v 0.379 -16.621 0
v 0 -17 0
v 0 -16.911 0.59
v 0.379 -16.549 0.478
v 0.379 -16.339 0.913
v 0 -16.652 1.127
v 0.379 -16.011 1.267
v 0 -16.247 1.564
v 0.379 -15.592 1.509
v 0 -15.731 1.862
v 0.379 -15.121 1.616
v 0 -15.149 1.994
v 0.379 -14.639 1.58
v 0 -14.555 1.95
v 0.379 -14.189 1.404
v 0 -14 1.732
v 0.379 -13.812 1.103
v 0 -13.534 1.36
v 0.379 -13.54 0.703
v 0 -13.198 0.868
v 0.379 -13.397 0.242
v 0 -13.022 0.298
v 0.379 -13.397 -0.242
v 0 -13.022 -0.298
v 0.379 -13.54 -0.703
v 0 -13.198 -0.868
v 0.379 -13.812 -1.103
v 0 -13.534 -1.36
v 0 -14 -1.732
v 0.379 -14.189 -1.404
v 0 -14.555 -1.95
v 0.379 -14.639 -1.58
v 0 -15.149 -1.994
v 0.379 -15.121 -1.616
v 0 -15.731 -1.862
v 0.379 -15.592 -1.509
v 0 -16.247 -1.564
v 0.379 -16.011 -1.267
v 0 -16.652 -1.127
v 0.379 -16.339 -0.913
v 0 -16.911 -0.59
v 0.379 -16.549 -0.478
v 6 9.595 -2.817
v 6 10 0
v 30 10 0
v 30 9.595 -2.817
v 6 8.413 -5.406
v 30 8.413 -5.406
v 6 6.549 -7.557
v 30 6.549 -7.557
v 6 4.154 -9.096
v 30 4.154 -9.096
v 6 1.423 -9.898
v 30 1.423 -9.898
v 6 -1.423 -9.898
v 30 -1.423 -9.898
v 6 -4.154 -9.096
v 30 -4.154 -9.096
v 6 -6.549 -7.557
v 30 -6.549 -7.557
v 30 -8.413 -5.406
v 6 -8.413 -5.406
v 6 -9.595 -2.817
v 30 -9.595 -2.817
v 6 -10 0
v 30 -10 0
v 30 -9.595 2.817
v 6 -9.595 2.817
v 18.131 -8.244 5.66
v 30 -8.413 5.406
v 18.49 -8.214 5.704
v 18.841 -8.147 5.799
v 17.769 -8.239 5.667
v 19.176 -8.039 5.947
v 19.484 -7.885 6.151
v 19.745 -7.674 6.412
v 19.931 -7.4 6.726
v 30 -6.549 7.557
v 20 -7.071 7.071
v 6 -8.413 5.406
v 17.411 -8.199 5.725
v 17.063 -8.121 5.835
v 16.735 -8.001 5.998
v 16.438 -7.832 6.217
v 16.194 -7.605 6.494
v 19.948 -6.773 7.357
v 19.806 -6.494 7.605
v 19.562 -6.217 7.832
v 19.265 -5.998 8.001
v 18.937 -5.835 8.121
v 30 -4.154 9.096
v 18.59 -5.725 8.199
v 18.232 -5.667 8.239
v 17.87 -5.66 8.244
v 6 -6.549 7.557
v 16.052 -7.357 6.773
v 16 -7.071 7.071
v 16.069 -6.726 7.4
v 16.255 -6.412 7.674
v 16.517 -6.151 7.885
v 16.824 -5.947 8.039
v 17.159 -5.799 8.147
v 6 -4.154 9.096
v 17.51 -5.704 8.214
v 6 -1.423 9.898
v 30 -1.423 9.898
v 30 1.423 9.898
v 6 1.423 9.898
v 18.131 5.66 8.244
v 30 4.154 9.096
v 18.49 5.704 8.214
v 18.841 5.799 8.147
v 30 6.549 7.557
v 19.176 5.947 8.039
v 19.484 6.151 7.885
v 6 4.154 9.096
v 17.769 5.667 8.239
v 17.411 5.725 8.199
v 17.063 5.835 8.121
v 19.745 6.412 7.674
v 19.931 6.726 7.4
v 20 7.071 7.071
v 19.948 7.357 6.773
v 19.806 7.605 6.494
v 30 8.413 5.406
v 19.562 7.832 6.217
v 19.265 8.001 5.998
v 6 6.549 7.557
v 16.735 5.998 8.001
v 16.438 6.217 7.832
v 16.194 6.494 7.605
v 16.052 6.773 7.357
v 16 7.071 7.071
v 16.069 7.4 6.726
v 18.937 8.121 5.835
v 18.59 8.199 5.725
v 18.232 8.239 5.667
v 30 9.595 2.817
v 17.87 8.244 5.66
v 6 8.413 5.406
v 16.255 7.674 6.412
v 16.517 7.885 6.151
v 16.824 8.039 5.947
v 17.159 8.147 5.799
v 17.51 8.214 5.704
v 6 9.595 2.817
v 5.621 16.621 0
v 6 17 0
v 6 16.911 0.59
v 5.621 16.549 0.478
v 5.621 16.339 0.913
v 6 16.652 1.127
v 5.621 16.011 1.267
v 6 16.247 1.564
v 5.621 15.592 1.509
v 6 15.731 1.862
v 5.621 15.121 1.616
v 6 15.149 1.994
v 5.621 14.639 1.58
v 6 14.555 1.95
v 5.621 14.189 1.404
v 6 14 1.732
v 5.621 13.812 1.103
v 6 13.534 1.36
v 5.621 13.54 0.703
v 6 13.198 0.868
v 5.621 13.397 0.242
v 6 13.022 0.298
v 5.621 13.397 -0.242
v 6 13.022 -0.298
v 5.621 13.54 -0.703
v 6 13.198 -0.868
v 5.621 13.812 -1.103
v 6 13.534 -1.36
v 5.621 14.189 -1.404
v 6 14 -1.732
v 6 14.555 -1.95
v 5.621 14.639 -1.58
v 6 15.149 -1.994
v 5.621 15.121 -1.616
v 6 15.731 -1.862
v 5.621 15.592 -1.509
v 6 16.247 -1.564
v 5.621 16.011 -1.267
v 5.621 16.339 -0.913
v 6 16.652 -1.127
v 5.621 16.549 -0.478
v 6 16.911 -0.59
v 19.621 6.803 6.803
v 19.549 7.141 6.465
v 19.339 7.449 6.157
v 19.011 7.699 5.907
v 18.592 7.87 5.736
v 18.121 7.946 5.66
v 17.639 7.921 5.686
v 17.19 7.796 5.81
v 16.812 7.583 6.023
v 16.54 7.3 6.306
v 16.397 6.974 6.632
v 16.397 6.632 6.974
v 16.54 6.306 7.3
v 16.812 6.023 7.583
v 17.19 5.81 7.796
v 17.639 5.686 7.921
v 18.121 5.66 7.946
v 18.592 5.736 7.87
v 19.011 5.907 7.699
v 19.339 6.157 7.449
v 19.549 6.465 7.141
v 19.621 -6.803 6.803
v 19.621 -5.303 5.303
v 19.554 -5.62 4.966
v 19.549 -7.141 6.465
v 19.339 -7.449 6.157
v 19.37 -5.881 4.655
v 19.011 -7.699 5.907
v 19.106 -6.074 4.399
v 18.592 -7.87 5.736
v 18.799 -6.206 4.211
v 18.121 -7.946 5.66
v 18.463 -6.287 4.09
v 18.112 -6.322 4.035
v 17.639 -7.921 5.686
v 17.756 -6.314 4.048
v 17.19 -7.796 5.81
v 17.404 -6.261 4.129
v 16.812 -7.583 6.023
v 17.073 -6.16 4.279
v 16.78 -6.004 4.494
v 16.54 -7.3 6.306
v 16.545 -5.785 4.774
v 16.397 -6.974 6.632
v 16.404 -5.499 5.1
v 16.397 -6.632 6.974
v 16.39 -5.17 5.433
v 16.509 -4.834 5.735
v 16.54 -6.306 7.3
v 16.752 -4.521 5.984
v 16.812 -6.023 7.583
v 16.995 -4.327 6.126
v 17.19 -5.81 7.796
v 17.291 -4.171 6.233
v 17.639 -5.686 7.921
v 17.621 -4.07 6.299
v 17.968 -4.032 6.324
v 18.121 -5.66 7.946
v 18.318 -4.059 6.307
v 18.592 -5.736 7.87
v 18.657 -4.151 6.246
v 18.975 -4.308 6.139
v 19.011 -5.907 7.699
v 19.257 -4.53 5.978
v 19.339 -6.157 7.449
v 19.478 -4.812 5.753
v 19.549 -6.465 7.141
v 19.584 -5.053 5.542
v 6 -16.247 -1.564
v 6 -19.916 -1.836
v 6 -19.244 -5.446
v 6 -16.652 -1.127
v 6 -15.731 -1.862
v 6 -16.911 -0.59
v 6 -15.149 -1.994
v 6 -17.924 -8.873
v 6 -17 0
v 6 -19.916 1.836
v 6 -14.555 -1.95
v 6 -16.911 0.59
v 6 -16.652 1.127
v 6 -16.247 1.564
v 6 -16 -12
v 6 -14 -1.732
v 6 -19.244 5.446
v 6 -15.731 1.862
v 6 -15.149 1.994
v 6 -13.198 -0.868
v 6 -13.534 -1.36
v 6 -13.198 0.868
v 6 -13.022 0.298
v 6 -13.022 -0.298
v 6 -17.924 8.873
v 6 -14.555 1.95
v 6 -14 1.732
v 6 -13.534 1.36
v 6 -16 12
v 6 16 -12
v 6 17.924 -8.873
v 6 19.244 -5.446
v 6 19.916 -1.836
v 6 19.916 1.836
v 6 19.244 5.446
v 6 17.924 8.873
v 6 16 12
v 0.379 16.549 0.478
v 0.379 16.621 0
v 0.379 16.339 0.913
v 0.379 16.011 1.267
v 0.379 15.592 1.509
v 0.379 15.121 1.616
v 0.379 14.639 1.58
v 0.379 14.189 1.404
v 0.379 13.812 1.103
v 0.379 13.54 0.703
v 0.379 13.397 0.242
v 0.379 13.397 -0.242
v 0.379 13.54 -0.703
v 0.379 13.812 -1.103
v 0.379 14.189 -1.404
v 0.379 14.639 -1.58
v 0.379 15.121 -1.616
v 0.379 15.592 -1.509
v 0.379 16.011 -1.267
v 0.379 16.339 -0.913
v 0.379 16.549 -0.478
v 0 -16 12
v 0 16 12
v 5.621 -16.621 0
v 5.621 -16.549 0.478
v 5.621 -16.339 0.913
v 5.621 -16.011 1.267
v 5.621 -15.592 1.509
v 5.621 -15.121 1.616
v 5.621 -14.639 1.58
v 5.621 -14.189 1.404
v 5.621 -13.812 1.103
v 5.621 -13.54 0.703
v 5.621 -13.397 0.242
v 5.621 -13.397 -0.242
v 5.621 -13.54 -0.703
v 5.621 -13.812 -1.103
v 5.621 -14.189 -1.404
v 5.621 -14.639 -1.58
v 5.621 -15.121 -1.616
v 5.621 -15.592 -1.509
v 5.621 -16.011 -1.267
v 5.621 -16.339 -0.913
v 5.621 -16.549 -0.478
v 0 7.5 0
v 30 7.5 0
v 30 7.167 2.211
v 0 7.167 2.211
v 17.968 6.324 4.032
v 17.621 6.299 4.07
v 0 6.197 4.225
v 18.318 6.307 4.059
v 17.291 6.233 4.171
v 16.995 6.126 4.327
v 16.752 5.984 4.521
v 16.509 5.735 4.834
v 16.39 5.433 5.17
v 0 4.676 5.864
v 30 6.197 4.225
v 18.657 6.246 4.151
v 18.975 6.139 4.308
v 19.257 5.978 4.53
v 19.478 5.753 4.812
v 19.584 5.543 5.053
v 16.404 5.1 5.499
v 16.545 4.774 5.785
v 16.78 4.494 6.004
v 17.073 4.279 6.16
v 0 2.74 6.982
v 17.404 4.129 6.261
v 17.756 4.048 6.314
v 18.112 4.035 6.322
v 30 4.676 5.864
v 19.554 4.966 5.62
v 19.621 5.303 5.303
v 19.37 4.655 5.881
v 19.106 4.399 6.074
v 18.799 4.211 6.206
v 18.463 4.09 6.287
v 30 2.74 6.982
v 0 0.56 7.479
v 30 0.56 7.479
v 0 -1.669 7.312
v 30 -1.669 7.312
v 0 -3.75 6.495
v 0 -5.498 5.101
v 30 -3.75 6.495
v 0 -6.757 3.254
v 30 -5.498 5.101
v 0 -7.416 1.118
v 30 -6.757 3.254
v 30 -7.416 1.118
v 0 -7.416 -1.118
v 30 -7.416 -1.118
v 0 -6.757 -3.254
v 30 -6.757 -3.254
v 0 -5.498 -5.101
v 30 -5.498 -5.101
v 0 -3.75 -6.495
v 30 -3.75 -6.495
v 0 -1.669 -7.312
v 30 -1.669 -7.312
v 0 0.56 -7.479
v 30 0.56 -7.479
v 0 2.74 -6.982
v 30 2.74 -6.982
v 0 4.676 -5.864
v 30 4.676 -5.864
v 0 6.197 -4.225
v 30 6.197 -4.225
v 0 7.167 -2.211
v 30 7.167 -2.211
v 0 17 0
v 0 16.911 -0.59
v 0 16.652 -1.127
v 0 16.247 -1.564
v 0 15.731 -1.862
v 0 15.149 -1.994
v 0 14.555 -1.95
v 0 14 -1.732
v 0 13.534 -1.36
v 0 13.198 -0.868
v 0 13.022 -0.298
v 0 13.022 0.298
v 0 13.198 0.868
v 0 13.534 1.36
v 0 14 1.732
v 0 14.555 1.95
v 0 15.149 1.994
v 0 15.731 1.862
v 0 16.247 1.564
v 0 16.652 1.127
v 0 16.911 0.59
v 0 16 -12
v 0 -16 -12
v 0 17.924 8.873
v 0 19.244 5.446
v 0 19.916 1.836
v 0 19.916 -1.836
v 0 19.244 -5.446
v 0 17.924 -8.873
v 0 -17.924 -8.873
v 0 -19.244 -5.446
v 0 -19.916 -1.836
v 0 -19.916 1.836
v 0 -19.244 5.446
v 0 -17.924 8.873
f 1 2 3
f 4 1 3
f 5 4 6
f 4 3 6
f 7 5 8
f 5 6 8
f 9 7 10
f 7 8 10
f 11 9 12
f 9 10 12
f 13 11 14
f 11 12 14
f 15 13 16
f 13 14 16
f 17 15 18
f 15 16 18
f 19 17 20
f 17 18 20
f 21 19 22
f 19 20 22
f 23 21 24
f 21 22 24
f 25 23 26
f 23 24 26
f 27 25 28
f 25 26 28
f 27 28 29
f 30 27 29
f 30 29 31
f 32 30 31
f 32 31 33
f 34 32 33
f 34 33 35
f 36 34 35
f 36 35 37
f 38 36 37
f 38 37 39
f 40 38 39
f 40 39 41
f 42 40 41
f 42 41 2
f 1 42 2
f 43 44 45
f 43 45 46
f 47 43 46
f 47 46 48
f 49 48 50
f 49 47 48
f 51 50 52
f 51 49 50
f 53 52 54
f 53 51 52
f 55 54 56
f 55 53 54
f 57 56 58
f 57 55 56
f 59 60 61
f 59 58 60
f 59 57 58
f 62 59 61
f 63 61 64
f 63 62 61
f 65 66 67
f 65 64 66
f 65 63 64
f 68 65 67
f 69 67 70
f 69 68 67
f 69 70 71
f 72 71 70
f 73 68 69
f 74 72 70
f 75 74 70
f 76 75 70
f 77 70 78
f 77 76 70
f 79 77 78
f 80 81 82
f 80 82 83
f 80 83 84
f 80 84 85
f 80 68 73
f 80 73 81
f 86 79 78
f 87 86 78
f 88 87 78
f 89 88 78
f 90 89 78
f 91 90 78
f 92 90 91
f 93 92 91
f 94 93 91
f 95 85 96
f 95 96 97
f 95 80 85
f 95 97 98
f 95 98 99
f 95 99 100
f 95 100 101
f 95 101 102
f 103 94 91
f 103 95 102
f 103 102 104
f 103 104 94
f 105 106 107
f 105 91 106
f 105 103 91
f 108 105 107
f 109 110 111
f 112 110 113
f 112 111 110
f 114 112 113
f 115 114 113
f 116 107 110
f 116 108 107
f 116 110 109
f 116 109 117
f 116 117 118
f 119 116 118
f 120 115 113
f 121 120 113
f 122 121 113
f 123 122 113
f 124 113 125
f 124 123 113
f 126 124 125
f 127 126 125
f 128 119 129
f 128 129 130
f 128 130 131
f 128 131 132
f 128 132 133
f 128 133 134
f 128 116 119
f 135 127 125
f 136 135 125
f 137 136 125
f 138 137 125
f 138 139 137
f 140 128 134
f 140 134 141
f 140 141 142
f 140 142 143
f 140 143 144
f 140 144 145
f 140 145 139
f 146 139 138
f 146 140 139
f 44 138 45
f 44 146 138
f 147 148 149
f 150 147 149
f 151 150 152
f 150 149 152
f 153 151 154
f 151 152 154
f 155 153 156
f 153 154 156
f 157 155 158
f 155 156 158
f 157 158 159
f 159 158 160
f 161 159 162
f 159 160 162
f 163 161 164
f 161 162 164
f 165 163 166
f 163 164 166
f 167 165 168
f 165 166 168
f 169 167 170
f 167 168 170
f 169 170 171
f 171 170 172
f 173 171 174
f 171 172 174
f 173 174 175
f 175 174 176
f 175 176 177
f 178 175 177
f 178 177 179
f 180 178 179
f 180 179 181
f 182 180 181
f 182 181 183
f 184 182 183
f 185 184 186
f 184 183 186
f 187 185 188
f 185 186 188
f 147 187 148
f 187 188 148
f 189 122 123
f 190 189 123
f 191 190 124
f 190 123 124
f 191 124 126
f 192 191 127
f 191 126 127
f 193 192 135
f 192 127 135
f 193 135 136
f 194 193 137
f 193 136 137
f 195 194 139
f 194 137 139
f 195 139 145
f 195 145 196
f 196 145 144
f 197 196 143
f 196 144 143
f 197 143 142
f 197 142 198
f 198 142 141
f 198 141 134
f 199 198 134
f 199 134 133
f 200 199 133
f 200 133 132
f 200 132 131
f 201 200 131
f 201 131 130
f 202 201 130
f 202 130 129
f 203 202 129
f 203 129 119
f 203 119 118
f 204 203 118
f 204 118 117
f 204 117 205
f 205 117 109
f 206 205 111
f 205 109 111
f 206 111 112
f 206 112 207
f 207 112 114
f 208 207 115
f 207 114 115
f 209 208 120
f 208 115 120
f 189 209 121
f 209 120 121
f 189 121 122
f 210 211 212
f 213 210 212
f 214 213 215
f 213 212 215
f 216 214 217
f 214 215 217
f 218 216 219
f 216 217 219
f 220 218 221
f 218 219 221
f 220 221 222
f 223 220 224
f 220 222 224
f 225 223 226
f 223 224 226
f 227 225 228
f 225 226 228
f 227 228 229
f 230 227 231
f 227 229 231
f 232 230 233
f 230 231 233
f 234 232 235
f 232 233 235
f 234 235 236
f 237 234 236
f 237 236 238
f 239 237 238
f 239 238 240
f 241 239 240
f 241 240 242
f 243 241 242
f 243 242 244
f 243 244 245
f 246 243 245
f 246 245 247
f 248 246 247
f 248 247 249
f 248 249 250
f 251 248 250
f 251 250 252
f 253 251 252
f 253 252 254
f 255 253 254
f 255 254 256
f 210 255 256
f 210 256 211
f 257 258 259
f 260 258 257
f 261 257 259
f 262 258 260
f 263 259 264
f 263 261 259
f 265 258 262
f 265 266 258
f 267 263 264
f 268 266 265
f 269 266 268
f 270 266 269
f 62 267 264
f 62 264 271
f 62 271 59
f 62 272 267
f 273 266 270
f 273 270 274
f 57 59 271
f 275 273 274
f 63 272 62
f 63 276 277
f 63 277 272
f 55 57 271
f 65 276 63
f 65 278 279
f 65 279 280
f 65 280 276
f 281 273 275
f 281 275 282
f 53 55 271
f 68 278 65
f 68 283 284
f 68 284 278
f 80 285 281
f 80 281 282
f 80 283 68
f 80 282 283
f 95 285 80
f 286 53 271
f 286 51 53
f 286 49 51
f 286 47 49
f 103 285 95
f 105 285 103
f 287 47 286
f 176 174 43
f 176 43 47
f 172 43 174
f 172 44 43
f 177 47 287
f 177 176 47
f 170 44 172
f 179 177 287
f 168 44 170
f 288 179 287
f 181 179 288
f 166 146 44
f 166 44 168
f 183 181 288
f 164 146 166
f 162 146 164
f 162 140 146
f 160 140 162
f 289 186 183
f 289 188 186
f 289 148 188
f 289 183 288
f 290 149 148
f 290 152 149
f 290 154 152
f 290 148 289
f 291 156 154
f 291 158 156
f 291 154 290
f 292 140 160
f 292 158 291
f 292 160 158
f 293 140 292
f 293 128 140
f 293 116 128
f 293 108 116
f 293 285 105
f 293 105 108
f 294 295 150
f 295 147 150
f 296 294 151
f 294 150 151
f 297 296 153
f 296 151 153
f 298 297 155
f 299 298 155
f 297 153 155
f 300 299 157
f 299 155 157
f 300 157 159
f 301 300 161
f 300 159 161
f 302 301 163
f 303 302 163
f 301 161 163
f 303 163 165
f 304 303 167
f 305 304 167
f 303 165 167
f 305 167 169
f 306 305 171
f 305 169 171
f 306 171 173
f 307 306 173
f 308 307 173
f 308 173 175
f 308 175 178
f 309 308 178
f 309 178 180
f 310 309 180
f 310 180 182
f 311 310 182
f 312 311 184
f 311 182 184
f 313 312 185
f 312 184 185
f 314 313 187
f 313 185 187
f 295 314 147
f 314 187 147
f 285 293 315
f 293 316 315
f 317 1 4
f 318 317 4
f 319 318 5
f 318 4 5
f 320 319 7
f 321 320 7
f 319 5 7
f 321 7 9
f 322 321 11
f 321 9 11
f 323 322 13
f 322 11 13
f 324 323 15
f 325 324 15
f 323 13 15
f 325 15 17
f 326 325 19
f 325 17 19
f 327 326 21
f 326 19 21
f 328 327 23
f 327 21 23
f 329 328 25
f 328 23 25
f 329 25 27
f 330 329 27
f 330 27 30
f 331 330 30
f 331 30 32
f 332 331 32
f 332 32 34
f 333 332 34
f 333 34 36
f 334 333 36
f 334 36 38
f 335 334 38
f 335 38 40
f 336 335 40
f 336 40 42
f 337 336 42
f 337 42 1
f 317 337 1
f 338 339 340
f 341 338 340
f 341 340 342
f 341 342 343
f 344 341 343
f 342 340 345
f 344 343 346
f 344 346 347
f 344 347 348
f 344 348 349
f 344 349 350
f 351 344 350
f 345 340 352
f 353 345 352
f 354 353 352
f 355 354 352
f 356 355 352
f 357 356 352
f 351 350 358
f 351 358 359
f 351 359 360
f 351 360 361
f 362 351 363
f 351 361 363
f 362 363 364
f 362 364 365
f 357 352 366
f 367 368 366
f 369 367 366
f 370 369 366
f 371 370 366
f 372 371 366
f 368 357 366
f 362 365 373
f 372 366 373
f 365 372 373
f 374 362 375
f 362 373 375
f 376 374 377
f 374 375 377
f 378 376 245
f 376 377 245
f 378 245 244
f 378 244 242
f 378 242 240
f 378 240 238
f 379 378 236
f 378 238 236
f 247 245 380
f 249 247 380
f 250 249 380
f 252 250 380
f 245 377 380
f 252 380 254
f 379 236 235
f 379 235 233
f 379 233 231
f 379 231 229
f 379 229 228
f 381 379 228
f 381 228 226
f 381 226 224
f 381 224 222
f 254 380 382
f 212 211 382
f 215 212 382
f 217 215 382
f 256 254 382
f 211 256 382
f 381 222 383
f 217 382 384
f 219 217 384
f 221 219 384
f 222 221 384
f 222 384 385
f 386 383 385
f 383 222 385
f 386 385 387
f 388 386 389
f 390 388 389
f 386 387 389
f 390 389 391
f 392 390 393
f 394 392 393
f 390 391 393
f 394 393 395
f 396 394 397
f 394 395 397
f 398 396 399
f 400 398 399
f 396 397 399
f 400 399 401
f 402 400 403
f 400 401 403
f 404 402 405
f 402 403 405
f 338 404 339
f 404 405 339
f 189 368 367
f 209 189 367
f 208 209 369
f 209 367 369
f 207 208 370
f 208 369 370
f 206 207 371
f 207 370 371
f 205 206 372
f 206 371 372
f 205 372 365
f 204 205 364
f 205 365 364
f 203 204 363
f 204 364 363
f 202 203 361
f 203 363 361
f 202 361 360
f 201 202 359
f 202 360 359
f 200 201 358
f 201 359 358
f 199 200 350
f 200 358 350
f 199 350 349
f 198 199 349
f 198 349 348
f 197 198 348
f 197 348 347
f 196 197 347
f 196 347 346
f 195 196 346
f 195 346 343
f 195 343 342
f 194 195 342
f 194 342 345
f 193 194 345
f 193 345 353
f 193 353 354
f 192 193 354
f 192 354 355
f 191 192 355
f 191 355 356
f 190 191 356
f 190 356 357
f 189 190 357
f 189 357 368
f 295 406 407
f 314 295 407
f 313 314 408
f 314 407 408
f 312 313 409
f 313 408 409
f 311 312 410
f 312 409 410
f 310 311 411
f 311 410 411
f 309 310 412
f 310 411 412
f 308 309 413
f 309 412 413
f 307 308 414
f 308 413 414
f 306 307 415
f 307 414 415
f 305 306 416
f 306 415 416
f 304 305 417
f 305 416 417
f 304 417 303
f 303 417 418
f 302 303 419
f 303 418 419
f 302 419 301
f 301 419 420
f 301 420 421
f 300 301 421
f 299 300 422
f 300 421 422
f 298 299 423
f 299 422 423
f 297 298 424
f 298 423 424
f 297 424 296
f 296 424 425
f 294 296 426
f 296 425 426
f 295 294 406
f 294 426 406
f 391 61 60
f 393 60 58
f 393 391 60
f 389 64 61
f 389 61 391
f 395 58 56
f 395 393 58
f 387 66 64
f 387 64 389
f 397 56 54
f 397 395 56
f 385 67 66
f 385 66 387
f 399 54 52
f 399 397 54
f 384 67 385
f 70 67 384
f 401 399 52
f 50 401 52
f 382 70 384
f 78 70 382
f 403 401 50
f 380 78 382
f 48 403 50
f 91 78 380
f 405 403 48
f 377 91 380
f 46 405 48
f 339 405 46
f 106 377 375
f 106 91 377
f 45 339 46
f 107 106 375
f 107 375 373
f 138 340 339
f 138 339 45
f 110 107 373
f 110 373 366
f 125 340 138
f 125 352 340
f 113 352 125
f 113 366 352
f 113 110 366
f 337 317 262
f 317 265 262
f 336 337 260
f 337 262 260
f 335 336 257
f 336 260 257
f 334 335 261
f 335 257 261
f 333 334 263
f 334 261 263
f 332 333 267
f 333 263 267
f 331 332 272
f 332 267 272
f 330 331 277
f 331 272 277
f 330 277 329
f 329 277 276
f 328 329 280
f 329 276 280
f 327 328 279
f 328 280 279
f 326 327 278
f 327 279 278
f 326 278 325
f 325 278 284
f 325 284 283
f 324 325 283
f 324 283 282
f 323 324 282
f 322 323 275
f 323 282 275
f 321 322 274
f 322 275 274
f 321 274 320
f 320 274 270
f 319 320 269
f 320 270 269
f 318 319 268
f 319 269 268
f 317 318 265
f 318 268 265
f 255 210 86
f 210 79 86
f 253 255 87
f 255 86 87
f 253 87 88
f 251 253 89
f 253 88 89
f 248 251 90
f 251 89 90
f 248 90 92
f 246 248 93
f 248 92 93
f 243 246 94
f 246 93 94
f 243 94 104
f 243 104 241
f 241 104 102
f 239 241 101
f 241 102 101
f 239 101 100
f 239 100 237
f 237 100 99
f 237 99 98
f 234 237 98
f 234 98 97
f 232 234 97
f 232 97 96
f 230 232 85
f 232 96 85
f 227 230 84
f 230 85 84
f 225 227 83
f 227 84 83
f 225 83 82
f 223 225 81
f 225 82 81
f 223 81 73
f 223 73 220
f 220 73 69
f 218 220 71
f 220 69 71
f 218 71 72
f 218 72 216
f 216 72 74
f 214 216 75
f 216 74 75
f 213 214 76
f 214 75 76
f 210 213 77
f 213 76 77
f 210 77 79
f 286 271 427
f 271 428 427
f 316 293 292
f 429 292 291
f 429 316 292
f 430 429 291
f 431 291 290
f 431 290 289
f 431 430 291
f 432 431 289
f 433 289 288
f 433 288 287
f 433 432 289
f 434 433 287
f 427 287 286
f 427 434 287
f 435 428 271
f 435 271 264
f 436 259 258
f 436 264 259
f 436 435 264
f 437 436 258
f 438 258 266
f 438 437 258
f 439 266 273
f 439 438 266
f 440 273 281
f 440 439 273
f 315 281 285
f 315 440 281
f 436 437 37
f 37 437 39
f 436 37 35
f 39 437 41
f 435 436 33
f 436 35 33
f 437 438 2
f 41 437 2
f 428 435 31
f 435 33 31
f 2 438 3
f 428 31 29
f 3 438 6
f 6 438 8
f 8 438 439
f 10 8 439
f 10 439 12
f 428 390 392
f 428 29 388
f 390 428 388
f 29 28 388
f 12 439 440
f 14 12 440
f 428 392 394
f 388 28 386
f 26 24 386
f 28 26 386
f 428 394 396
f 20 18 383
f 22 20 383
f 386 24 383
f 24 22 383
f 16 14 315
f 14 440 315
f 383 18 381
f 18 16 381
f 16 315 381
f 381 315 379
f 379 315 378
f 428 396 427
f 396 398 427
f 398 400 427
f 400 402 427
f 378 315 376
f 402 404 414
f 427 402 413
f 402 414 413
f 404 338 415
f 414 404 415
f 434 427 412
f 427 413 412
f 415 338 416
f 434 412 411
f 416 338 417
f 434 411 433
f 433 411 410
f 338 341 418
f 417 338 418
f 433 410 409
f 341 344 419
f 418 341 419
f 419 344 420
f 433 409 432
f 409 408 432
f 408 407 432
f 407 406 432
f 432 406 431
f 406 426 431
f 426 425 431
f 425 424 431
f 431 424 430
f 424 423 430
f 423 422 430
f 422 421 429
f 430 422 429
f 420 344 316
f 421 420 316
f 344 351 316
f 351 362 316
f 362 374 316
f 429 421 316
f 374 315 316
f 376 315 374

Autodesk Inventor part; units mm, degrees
sketch "Sketch_1" plane through (0, 0, 0) normal (0, 0, 1) x (1, 0, 0)
  line L0 (30, 0) -> (0, 0)
  line L1 (0, 20) -> (0, 7.5)
  line L2 (0, 7.5) -> (30, 7.5)
  line L3 (30, 7.5) -> (30, 10)
  line L4 (30, 10) -> (6, 10)
  line L5 (6, 10) -> (6, 20)
  line L6 (6, 20) -> (0, 20)
revolve "Revolution1" add sketch "Sketch_1" angle 360 about axis through (30, 0, 0) along (1, 0, 0)
sketch "Sketch_3" plane through (0, 0, 0) normal (0, -0.7071, 0.7071) x (1, 0, 0)
  line L0 (18, 7.2284) -> (18, 10)
  line L1 (18, 10) -> (20, 10)
  line L2 (20, 10) -> (19.621, 9.621)
  line L3 (19.621, 9.621) -> (19.621, 7.2284)
  line L4 (19.621, 7.2284) -> (18, 7.2284)
  line L5 (18, 7.2284) -> (18, 10)
revolve "Revolution2" cut sketch "Sketch_3" angle 360 about axis through (18, 5.1113, 5.1113) along (0, -0.7071, -0.7071)
thread "Thread1" size "M4x0.7" class "6H" standard "ISO Metric profile" length 2.3926
sketch "Sketch_2" plane through (0, 0, 0) normal (0, -0.7071, -0.7071) x (1, 0, 0)
  line L0 (18, 7.2284) -> (18, 10)
  line L1 (18, 10) -> (20, 10)
  line L2 (20, 10) -> (19.621, 9.621)
  line L3 (19.621, 9.621) -> (19.621, 7.2284)
  line L4 (19.621, 7.2284) -> (18, 7.2284)
  line L5 (18, 7.2284) -> (18, 10)
revolve "Revolution3" cut sketch "Sketch_2" angle 360 about axis through (18, -5.1113, 5.1113) along (0, 0.7071, -0.7071)
thread "Thread2" size "M4x0.7" class "6H" standard "ISO Metric profile" length 2.3926
sketch "Sketch_4" plane through (0, 0, 0) normal (1, 0, 0) x (0, 1, 0)
  circle A0 centre (0, 0) radius 150
  line L0 (-50, 12) -> (-50, -12)
  line L1 (-50, -12) -> (50, -12)
  line L2 (50, -12) -> (50, 12)
  line L3 (50, 12) -> (-50, 12)
extrude "Extrusion1" cut sketch "Sketch_4" along normal blind 30
sketch "Sketch_12" plane through (0, 0, 0) normal (0, 0, 1) x (1, 0, 0)
  line L0 (6, 15) -> (0, 15)
  line L1 (0, 15) -> (0, 17)
  line L2 (0, 17) -> (0.379, 16.621)
  line L3 (0.379, 16.621) -> (5.621, 16.621)
  line L4 (5.621, 16.621) -> (6, 17)
  line L5 (6, 17) -> (6, 15)
  line L6 (6, 15) -> (0, 15)
revolve "Revolution4" cut sketch "Sketch_12" angle 360 about axis through (6, 15, 0) along (1, 0, 0)
thread "Thread3" size "M4x0.7" class "6H" standard "ISO Metric profile" full length
sketch "Sketch_14" plane through (0, 0, 0) normal (0, 0, 1) x (1, 0, 0)
  line L0 (0, -15) -> (6, -15)
  line L1 (6, -15) -> (6, -17)
  line L2 (6, -17) -> (5.621, -16.621)
  line L3 (5.621, -16.621) -> (0.379, -16.621)
  line L4 (0.379, -16.621) -> (0, -17)
  line L5 (0, -17) -> (0, -15)
  line L6 (0, -15) -> (6, -15)
revolve "Revolution5" cut sketch "Sketch_14" angle 360 about axis through (0, -15, 0) along (-1, 0, 0)
thread "Thread4" size "M4x0.7" class "6H" standard "ISO Metric profile" full length
ref_plane "to_screw1_XY" through (18, -5.3033, 5.3033) normal (0, -0.7071, 0.7071) x (1, 0, 0)
ref_plane "to_screw1_YZ" through (18, -5.3033, 5.3033) normal (1, 0, 0) x (0, 0.7071, 0.7071)
ref_plane "to_screw1_ZX" through (18, -5.3033, 5.3033) normal (0, 0.7071, 0.7071) x (0, -0.7071, 0.7071)
ref_plane "to_screw2_XY" through (18, 5.3033, 5.3033) normal (0, 0.7071, 0.7071) x (1, 0, 0)
ref_plane "to_screw2_YZ" through (18, 5.3033, 5.3033) normal (1, 0, 0) x (0, 0.7071, -0.7071)
ref_plane "to_screw2_ZX" through (18, 5.3033, 5.3033) normal (0, 0.7071, -0.7071) x (0, 0.7071, 0.7071)
properties part number "STHCBT15-MB_ss"
